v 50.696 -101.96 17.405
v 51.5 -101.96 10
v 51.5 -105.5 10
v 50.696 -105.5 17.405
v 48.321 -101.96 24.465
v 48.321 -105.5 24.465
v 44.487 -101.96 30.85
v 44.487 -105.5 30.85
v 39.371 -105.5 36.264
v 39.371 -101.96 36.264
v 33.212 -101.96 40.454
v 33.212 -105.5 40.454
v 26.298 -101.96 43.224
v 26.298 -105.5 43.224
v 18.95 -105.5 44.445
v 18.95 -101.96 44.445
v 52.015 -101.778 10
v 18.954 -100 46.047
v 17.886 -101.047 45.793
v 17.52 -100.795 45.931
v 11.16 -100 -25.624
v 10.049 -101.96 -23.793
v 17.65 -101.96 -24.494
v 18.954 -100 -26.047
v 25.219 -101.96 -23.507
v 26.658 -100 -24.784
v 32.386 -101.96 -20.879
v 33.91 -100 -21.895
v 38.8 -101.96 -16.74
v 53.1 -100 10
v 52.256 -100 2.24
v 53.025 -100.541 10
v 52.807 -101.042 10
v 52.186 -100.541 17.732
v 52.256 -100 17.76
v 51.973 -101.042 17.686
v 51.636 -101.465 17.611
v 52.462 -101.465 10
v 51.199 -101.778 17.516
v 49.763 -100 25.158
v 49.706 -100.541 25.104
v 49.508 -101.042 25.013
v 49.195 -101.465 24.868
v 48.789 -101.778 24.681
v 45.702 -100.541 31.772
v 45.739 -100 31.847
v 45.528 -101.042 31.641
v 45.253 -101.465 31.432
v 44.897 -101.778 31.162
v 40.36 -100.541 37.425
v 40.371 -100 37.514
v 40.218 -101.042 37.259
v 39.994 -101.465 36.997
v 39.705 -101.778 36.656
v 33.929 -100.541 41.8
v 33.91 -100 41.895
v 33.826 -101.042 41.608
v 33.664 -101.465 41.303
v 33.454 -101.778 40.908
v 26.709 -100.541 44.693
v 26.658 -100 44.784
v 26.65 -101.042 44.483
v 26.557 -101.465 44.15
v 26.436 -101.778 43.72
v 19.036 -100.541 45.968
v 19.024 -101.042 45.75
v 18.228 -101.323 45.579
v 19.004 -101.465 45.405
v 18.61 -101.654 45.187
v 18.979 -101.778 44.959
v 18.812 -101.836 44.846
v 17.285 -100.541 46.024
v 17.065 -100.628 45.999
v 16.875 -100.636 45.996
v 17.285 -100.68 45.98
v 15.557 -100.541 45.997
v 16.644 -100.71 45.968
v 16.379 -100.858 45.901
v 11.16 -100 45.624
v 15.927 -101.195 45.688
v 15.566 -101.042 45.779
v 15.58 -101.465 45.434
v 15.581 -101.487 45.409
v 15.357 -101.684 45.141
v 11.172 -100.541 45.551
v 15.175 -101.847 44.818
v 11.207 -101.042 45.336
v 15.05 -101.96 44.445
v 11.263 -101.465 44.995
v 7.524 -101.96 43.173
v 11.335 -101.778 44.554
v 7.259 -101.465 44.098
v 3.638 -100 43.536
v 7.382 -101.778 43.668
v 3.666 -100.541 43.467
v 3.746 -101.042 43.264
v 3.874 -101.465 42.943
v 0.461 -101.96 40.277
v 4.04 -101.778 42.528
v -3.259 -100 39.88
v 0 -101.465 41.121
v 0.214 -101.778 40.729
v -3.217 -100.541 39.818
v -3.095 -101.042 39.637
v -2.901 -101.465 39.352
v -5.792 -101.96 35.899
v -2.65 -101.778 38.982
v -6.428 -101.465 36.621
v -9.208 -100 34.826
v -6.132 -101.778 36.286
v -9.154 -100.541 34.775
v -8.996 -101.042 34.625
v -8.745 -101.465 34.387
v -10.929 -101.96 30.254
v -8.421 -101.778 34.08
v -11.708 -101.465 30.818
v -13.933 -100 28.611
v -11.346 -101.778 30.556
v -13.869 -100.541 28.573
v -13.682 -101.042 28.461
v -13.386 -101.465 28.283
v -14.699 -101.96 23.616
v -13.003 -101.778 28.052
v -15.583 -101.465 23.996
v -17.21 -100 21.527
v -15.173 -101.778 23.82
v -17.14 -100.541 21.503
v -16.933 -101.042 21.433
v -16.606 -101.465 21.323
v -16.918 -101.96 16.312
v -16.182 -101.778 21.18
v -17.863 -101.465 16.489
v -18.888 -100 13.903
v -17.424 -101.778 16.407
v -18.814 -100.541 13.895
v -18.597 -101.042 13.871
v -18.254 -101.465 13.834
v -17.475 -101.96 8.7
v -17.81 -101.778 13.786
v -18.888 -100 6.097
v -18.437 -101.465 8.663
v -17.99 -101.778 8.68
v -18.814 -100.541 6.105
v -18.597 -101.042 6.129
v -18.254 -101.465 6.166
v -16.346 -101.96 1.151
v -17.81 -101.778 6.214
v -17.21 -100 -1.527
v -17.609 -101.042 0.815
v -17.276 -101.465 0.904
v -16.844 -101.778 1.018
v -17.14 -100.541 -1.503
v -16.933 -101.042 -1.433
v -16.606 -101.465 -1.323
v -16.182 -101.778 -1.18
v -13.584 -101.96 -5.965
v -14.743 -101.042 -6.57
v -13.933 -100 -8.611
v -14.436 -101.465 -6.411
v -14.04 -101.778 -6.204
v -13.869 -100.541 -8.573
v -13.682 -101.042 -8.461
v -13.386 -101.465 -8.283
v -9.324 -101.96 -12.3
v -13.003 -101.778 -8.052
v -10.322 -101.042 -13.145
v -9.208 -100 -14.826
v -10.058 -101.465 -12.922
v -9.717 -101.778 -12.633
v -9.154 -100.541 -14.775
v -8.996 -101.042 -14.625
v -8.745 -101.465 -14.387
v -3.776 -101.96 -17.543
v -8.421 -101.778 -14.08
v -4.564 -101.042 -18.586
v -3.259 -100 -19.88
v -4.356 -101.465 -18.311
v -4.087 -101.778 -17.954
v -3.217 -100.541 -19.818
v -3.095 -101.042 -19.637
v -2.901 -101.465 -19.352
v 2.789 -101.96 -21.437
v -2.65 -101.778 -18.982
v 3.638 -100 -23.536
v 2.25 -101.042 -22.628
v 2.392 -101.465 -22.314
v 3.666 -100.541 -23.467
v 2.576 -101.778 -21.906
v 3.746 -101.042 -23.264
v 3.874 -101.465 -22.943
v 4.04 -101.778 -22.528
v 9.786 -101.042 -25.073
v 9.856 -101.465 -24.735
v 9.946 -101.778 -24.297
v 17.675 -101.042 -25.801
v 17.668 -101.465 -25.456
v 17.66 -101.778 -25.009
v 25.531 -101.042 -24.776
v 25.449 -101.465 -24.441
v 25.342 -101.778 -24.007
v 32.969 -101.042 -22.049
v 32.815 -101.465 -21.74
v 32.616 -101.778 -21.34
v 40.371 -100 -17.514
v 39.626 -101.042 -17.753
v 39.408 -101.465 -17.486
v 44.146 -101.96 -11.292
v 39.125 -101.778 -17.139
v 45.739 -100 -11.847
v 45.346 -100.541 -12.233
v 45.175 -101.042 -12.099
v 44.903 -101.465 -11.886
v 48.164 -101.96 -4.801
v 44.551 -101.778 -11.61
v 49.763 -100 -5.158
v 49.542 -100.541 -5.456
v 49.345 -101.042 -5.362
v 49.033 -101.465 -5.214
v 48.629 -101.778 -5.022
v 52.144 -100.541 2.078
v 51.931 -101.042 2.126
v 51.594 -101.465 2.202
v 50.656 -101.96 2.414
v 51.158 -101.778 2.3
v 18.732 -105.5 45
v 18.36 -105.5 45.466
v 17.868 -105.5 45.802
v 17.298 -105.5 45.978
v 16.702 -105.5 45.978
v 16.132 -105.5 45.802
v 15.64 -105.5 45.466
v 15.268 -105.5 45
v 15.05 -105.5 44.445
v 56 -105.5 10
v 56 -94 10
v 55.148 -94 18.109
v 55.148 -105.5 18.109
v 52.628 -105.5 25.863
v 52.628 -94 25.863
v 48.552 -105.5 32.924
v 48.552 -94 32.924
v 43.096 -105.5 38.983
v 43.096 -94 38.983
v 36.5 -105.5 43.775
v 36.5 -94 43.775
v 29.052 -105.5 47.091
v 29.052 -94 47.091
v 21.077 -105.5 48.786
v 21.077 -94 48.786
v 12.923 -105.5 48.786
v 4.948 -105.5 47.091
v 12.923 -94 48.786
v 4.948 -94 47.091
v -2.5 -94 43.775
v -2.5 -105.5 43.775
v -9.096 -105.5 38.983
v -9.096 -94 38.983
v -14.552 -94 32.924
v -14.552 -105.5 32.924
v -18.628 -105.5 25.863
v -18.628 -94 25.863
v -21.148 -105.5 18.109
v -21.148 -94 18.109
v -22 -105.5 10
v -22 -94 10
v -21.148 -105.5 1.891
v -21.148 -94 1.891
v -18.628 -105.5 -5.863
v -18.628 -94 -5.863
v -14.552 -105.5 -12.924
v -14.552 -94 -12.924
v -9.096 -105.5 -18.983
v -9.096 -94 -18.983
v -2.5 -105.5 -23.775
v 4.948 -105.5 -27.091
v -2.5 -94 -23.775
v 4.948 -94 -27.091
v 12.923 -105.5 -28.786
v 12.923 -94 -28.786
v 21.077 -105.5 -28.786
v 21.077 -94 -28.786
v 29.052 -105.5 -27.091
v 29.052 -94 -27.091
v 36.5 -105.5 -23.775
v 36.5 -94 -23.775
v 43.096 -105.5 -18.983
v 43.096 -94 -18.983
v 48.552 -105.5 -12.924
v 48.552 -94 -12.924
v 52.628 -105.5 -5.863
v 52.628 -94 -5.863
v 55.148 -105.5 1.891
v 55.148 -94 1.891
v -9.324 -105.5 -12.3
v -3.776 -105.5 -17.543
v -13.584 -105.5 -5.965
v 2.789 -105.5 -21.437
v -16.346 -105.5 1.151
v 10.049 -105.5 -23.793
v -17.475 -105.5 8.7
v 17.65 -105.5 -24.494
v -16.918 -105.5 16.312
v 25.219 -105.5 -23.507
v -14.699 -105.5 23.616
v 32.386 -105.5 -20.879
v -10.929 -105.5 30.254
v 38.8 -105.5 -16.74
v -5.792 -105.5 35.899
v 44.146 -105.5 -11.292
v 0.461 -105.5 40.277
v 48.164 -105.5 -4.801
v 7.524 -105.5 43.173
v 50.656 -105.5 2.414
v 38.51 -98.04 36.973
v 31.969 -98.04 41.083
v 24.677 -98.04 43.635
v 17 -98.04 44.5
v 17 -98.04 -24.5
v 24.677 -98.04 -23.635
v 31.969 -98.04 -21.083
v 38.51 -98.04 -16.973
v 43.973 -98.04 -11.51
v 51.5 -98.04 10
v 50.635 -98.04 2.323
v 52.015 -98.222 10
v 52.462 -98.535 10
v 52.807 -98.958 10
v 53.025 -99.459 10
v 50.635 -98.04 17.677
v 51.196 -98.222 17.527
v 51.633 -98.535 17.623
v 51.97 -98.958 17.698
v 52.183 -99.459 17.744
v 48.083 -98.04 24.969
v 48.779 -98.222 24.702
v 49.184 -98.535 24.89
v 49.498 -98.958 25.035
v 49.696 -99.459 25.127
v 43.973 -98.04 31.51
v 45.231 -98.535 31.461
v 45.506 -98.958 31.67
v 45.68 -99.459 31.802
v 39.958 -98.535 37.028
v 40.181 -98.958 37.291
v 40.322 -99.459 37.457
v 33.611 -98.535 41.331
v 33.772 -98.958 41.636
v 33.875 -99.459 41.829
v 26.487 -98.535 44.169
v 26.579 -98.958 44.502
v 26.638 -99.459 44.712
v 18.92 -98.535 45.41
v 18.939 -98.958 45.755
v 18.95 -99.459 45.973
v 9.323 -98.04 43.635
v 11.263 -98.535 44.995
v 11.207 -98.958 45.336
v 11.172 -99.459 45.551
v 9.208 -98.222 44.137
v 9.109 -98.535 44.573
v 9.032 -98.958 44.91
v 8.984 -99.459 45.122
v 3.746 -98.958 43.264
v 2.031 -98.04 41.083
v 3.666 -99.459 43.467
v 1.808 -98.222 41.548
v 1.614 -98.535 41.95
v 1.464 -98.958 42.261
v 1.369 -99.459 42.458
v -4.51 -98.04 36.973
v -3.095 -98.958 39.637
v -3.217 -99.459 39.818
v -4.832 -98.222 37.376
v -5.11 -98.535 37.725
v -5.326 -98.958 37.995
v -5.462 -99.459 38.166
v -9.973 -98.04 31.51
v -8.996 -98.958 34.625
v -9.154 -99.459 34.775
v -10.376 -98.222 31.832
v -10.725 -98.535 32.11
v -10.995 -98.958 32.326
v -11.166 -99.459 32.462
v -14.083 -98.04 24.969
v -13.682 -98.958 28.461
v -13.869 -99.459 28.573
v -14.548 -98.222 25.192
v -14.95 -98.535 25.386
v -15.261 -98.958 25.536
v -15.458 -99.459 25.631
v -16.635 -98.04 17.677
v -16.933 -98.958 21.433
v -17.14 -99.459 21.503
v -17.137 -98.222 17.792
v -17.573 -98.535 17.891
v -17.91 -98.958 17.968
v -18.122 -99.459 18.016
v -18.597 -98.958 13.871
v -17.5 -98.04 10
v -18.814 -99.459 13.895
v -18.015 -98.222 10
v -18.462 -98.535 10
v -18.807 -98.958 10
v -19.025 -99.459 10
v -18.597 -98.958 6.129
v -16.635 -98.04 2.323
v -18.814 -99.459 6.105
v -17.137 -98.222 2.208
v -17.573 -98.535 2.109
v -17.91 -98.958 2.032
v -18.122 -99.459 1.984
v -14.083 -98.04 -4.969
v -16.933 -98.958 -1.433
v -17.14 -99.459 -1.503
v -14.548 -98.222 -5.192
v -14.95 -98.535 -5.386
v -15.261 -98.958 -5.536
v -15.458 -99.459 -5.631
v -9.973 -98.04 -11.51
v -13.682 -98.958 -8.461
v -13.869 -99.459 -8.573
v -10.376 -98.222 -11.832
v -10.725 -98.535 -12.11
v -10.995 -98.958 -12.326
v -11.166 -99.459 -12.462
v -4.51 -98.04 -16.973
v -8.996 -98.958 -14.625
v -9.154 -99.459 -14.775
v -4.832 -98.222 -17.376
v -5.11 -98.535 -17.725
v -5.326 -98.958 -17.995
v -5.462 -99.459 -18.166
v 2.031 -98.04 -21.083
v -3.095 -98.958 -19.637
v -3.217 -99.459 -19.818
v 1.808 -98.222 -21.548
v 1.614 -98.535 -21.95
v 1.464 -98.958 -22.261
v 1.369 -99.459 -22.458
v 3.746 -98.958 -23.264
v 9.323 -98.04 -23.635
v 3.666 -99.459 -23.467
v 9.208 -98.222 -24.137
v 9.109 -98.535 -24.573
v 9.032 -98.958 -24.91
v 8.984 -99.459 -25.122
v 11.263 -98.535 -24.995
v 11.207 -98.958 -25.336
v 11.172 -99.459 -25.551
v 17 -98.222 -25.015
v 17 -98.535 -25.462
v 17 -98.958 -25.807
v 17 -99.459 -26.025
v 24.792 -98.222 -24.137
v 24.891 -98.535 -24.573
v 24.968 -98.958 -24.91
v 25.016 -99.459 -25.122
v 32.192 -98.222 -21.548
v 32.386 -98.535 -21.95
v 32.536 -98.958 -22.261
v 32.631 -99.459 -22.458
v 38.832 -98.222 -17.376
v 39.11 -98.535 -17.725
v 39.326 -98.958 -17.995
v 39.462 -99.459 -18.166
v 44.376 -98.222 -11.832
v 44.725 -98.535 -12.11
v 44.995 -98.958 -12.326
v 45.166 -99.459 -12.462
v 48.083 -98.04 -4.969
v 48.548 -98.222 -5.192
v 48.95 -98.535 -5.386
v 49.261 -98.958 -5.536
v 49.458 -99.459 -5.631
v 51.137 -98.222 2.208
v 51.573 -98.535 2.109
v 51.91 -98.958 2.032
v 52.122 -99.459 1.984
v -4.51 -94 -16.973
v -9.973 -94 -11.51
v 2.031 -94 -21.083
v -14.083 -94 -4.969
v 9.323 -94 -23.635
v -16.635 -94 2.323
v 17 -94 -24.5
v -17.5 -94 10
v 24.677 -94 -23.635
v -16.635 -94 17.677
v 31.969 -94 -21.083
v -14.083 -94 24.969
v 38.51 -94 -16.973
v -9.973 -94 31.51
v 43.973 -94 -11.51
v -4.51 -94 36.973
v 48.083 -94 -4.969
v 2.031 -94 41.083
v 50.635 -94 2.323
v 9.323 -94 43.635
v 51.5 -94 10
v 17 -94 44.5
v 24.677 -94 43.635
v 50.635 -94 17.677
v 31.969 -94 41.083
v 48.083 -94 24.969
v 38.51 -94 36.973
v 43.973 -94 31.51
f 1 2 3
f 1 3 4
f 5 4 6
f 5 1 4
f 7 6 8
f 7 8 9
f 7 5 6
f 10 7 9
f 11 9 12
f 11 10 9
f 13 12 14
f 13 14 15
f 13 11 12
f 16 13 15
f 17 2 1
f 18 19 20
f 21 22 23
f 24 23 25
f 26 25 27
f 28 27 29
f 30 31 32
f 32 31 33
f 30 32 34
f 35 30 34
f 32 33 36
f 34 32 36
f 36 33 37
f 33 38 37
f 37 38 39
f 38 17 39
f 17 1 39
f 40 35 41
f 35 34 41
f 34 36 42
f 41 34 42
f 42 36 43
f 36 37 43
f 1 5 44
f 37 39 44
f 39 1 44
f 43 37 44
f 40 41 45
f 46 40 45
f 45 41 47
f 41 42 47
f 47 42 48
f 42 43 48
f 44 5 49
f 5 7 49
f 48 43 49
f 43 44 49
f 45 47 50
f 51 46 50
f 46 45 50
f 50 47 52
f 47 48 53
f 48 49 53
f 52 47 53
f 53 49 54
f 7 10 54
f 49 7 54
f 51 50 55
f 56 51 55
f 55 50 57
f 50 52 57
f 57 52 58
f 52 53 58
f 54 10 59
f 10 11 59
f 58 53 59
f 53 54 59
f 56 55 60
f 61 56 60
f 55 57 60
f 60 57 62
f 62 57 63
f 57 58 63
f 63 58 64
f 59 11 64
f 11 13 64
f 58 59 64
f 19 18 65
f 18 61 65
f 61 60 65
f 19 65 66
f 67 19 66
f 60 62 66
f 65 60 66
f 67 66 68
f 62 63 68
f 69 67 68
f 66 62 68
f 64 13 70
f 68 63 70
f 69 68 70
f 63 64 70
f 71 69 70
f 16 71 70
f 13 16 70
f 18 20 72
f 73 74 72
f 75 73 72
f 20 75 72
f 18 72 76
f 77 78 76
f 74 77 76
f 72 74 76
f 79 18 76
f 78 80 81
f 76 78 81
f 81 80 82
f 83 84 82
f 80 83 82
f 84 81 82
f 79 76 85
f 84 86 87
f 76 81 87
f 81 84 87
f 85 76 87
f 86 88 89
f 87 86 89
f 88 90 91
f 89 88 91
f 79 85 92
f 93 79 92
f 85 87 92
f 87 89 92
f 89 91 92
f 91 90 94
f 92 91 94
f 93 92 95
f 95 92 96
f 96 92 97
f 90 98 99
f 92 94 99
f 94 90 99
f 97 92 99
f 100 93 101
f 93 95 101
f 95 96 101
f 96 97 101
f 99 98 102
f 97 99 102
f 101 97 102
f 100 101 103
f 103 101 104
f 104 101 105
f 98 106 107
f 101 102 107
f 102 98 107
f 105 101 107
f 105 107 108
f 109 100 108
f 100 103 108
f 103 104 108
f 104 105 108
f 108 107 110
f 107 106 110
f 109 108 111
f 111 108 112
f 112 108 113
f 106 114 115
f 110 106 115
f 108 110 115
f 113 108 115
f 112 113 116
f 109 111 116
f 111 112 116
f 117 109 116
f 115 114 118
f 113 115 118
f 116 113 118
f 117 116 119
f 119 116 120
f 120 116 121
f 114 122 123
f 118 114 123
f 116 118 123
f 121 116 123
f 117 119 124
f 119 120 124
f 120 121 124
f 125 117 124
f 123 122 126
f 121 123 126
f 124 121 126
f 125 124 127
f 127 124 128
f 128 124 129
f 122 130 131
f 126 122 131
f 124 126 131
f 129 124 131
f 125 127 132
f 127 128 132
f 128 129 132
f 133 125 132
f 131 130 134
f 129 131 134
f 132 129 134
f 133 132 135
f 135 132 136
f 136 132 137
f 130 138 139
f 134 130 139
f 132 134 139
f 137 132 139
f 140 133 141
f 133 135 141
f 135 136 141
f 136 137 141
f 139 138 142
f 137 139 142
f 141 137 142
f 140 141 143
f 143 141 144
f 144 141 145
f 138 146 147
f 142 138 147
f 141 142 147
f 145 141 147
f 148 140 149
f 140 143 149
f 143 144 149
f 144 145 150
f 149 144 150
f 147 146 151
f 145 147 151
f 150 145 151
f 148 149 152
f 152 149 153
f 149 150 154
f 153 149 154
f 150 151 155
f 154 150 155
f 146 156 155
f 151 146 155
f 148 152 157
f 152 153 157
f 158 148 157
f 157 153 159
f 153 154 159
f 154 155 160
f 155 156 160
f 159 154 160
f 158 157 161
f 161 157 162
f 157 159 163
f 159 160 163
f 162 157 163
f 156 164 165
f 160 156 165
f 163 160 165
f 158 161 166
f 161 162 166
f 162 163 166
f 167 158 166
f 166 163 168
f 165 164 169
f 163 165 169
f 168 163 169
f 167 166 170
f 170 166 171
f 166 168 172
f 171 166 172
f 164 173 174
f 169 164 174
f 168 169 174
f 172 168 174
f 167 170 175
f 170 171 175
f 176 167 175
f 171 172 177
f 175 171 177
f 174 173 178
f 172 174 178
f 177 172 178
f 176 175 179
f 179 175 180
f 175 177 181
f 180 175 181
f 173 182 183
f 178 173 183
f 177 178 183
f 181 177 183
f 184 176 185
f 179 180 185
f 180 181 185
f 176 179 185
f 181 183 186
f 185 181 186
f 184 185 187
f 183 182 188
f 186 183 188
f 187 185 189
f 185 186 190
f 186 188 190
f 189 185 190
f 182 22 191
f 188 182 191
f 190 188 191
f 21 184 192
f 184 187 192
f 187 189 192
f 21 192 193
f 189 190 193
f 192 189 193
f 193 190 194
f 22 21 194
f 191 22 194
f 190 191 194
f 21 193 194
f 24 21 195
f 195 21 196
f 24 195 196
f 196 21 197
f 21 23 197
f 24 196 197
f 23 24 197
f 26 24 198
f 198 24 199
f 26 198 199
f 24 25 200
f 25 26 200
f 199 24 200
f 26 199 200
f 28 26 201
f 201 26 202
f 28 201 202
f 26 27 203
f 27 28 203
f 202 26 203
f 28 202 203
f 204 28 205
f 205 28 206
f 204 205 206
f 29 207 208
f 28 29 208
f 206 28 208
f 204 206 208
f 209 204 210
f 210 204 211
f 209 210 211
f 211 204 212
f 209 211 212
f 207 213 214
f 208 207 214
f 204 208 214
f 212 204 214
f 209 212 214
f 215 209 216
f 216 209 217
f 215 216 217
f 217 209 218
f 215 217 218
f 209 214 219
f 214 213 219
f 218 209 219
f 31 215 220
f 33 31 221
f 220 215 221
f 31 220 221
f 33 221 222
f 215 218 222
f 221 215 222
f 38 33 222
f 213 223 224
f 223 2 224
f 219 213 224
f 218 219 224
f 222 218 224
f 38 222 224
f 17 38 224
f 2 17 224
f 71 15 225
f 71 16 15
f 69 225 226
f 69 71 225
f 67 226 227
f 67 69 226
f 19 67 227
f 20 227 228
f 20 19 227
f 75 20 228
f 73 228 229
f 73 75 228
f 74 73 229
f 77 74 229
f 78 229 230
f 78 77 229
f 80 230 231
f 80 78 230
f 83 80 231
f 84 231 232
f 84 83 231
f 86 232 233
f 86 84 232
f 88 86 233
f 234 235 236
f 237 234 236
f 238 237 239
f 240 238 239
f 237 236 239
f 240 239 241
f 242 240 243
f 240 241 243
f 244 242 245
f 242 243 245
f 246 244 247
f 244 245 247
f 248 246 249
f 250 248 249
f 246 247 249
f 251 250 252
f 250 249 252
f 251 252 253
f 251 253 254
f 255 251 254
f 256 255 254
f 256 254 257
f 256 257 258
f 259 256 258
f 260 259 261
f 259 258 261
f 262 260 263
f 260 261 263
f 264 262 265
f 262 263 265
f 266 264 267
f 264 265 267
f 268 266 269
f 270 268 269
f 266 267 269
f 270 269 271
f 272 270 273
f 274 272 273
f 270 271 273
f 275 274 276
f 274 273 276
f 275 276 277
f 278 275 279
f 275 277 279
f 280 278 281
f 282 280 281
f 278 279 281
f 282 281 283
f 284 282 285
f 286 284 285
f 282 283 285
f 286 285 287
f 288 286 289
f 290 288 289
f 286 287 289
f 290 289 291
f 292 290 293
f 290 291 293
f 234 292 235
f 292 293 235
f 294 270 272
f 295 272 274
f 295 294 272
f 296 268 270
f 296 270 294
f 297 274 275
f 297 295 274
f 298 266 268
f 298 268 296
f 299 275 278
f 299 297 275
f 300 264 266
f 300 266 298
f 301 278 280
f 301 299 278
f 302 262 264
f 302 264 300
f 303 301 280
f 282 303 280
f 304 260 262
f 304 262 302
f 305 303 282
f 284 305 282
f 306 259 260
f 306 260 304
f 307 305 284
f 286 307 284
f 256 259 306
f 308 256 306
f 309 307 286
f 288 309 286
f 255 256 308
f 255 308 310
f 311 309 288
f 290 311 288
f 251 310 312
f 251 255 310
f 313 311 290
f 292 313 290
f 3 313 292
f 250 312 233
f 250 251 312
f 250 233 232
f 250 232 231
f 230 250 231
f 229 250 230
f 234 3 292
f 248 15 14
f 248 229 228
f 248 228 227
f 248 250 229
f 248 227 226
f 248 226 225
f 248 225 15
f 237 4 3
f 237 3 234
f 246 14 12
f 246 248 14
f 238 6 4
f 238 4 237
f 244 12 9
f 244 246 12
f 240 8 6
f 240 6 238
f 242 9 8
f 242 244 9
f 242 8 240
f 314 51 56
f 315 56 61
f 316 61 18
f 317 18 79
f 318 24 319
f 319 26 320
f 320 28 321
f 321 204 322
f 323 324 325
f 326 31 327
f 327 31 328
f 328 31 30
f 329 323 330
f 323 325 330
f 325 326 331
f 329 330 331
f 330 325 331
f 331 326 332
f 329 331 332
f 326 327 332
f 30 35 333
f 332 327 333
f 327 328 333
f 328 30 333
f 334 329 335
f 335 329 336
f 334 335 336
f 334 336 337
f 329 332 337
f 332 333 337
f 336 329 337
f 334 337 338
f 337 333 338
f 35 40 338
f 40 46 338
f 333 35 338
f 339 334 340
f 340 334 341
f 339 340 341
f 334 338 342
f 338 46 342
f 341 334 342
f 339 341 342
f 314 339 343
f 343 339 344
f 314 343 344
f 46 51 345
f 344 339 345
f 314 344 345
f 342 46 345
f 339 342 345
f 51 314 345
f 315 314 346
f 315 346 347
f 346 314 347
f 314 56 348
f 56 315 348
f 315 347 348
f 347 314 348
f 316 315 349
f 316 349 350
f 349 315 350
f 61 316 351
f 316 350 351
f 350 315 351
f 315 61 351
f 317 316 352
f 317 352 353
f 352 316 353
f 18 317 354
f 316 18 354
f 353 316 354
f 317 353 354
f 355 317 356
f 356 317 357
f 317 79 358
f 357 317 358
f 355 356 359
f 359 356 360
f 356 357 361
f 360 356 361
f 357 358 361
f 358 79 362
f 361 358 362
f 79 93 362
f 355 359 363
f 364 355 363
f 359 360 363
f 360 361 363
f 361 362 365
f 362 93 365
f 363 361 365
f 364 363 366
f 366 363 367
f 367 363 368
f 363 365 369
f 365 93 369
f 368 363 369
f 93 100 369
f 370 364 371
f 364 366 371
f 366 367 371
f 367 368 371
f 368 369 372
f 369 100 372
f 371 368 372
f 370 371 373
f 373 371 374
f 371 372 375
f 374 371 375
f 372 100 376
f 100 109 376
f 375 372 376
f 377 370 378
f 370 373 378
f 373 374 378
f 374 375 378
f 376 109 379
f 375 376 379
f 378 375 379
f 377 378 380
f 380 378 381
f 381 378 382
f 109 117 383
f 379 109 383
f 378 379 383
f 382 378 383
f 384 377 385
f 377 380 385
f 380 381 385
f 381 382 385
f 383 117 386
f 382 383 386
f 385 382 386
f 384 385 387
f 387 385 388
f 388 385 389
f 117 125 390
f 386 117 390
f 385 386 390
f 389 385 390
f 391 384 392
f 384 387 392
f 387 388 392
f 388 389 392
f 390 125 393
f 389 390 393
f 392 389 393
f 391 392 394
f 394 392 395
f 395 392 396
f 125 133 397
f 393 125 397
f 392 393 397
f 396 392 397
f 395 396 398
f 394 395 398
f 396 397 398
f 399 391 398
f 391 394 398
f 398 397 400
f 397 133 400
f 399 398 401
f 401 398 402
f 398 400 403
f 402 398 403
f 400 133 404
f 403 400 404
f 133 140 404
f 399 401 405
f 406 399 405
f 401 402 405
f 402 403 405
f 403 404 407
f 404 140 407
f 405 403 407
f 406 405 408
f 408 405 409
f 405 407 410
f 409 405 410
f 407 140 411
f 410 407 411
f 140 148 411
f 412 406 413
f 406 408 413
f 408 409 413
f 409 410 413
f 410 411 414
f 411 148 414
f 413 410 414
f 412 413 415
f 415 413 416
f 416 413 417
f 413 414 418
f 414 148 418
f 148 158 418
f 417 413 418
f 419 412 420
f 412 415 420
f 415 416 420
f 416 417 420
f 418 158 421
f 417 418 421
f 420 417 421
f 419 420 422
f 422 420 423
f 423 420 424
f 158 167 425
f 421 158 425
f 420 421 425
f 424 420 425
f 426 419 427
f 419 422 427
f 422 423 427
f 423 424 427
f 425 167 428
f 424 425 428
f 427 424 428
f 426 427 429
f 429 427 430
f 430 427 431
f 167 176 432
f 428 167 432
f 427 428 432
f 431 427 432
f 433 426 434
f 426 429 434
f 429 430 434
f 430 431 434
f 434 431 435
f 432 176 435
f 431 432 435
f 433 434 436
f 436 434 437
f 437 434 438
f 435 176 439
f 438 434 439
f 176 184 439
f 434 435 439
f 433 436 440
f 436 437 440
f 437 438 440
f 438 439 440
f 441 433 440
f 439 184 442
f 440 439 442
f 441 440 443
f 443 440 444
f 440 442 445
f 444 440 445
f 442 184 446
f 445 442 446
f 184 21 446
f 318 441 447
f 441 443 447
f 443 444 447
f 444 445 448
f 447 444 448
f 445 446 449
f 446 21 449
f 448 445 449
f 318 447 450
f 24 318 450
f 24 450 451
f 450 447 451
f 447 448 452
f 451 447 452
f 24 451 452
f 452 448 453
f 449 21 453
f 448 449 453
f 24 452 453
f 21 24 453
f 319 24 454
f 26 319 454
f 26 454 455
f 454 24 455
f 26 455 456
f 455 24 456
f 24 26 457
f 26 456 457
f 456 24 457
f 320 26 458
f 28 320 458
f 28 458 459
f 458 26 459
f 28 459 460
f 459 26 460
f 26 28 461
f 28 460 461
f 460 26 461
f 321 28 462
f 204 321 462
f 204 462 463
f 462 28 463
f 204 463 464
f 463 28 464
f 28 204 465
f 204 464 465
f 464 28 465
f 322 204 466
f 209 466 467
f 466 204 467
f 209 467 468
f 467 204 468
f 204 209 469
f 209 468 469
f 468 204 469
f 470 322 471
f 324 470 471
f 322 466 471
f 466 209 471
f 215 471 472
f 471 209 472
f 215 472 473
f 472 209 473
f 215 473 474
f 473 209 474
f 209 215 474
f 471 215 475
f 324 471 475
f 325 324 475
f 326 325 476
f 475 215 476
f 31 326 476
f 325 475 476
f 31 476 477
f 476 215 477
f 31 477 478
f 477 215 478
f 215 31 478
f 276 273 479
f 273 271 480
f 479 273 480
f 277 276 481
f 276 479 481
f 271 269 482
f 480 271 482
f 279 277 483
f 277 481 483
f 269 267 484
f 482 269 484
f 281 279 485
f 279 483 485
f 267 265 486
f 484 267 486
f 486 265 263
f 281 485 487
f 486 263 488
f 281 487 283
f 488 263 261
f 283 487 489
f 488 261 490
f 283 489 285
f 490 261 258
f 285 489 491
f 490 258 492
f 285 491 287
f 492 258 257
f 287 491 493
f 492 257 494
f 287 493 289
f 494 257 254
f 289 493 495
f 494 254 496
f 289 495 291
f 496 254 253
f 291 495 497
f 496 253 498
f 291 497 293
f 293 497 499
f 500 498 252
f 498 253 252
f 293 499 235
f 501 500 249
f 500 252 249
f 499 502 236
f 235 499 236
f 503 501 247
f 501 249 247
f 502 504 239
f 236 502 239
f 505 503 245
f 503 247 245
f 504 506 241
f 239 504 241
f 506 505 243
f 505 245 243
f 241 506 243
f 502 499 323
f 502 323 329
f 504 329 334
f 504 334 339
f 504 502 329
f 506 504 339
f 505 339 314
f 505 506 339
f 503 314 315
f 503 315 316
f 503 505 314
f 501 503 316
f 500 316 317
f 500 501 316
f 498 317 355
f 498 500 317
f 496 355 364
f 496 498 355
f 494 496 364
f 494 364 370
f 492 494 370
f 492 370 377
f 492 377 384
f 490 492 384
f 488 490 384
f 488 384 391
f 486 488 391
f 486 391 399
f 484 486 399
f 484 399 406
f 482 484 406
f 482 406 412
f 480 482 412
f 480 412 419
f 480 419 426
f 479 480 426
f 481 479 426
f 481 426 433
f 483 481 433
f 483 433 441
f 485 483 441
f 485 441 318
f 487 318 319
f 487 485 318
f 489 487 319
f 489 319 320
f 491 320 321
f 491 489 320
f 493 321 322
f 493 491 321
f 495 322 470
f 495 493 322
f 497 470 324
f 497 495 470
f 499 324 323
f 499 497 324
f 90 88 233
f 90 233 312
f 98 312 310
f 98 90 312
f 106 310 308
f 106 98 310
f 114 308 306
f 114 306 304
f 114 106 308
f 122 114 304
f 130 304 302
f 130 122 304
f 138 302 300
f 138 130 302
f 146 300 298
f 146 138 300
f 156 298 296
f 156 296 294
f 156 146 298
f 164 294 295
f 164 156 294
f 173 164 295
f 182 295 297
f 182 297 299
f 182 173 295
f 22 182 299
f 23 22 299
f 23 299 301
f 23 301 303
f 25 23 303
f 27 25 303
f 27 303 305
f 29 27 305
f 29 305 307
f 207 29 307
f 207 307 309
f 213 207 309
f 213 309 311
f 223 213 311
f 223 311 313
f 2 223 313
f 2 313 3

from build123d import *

# Parameters (mm, degrees)
CYLINDER2620_R     = 2
CYLINDER2620_DEPTH = 10
TORUS004_R         = 2
TUBE115_R          = 39
TUBE115_R_2        = 34.5
TUBE115_DEPTH      = 11.5


with BuildPart() as v_lec2590:
    # Cylinder2620 → Cylinder2620 (new body)
    with BuildSketch(Plane(origin=(17, -98, 44), x_dir=(1, 0, 0), z_dir=(0, -1, 0))):
        Circle(CYLINDER2620_R)
    extrude(amount=CYLINDER2620_DEPTH)


with BuildPart() as anuloid004:
    # Torus004 → Torus004 (revolve)
    with BuildSketch(Plane(origin=(17, -98, 10), x_dir=(1, 0, 0), z_dir=(0, 0, -1))):
        with Locations((34.1, 0)):
            Circle(TORUS004_R)
    revolve(axis=Axis((17, -98, 10), (0, -1, 0)))


with BuildPart() as cut970:
    # Tube115 → Tube115 (new body)
    with BuildSketch(Plane(origin=(17, -92, 10), x_dir=(1, 0, 0), z_dir=(0, -1, 0))):
        Circle(TUBE115_R)
        Circle(TUBE115_R_2, mode=Mode.SUBTRACT)
    extrude(amount=TUBE115_DEPTH)

    # Cut969: cut Anuloid004
    add(anuloid004.part, mode=Mode.SUBTRACT)

    # Cut970: cut Válec2590
    add(v_lec2590.part, mode=Mode.SUBTRACT)


with BuildPart() as cut970_1:
    # Cut970 placement: moved
    add(cut970.part.moved(Location((0, -2, 0))))


solid = cut970_1.part
